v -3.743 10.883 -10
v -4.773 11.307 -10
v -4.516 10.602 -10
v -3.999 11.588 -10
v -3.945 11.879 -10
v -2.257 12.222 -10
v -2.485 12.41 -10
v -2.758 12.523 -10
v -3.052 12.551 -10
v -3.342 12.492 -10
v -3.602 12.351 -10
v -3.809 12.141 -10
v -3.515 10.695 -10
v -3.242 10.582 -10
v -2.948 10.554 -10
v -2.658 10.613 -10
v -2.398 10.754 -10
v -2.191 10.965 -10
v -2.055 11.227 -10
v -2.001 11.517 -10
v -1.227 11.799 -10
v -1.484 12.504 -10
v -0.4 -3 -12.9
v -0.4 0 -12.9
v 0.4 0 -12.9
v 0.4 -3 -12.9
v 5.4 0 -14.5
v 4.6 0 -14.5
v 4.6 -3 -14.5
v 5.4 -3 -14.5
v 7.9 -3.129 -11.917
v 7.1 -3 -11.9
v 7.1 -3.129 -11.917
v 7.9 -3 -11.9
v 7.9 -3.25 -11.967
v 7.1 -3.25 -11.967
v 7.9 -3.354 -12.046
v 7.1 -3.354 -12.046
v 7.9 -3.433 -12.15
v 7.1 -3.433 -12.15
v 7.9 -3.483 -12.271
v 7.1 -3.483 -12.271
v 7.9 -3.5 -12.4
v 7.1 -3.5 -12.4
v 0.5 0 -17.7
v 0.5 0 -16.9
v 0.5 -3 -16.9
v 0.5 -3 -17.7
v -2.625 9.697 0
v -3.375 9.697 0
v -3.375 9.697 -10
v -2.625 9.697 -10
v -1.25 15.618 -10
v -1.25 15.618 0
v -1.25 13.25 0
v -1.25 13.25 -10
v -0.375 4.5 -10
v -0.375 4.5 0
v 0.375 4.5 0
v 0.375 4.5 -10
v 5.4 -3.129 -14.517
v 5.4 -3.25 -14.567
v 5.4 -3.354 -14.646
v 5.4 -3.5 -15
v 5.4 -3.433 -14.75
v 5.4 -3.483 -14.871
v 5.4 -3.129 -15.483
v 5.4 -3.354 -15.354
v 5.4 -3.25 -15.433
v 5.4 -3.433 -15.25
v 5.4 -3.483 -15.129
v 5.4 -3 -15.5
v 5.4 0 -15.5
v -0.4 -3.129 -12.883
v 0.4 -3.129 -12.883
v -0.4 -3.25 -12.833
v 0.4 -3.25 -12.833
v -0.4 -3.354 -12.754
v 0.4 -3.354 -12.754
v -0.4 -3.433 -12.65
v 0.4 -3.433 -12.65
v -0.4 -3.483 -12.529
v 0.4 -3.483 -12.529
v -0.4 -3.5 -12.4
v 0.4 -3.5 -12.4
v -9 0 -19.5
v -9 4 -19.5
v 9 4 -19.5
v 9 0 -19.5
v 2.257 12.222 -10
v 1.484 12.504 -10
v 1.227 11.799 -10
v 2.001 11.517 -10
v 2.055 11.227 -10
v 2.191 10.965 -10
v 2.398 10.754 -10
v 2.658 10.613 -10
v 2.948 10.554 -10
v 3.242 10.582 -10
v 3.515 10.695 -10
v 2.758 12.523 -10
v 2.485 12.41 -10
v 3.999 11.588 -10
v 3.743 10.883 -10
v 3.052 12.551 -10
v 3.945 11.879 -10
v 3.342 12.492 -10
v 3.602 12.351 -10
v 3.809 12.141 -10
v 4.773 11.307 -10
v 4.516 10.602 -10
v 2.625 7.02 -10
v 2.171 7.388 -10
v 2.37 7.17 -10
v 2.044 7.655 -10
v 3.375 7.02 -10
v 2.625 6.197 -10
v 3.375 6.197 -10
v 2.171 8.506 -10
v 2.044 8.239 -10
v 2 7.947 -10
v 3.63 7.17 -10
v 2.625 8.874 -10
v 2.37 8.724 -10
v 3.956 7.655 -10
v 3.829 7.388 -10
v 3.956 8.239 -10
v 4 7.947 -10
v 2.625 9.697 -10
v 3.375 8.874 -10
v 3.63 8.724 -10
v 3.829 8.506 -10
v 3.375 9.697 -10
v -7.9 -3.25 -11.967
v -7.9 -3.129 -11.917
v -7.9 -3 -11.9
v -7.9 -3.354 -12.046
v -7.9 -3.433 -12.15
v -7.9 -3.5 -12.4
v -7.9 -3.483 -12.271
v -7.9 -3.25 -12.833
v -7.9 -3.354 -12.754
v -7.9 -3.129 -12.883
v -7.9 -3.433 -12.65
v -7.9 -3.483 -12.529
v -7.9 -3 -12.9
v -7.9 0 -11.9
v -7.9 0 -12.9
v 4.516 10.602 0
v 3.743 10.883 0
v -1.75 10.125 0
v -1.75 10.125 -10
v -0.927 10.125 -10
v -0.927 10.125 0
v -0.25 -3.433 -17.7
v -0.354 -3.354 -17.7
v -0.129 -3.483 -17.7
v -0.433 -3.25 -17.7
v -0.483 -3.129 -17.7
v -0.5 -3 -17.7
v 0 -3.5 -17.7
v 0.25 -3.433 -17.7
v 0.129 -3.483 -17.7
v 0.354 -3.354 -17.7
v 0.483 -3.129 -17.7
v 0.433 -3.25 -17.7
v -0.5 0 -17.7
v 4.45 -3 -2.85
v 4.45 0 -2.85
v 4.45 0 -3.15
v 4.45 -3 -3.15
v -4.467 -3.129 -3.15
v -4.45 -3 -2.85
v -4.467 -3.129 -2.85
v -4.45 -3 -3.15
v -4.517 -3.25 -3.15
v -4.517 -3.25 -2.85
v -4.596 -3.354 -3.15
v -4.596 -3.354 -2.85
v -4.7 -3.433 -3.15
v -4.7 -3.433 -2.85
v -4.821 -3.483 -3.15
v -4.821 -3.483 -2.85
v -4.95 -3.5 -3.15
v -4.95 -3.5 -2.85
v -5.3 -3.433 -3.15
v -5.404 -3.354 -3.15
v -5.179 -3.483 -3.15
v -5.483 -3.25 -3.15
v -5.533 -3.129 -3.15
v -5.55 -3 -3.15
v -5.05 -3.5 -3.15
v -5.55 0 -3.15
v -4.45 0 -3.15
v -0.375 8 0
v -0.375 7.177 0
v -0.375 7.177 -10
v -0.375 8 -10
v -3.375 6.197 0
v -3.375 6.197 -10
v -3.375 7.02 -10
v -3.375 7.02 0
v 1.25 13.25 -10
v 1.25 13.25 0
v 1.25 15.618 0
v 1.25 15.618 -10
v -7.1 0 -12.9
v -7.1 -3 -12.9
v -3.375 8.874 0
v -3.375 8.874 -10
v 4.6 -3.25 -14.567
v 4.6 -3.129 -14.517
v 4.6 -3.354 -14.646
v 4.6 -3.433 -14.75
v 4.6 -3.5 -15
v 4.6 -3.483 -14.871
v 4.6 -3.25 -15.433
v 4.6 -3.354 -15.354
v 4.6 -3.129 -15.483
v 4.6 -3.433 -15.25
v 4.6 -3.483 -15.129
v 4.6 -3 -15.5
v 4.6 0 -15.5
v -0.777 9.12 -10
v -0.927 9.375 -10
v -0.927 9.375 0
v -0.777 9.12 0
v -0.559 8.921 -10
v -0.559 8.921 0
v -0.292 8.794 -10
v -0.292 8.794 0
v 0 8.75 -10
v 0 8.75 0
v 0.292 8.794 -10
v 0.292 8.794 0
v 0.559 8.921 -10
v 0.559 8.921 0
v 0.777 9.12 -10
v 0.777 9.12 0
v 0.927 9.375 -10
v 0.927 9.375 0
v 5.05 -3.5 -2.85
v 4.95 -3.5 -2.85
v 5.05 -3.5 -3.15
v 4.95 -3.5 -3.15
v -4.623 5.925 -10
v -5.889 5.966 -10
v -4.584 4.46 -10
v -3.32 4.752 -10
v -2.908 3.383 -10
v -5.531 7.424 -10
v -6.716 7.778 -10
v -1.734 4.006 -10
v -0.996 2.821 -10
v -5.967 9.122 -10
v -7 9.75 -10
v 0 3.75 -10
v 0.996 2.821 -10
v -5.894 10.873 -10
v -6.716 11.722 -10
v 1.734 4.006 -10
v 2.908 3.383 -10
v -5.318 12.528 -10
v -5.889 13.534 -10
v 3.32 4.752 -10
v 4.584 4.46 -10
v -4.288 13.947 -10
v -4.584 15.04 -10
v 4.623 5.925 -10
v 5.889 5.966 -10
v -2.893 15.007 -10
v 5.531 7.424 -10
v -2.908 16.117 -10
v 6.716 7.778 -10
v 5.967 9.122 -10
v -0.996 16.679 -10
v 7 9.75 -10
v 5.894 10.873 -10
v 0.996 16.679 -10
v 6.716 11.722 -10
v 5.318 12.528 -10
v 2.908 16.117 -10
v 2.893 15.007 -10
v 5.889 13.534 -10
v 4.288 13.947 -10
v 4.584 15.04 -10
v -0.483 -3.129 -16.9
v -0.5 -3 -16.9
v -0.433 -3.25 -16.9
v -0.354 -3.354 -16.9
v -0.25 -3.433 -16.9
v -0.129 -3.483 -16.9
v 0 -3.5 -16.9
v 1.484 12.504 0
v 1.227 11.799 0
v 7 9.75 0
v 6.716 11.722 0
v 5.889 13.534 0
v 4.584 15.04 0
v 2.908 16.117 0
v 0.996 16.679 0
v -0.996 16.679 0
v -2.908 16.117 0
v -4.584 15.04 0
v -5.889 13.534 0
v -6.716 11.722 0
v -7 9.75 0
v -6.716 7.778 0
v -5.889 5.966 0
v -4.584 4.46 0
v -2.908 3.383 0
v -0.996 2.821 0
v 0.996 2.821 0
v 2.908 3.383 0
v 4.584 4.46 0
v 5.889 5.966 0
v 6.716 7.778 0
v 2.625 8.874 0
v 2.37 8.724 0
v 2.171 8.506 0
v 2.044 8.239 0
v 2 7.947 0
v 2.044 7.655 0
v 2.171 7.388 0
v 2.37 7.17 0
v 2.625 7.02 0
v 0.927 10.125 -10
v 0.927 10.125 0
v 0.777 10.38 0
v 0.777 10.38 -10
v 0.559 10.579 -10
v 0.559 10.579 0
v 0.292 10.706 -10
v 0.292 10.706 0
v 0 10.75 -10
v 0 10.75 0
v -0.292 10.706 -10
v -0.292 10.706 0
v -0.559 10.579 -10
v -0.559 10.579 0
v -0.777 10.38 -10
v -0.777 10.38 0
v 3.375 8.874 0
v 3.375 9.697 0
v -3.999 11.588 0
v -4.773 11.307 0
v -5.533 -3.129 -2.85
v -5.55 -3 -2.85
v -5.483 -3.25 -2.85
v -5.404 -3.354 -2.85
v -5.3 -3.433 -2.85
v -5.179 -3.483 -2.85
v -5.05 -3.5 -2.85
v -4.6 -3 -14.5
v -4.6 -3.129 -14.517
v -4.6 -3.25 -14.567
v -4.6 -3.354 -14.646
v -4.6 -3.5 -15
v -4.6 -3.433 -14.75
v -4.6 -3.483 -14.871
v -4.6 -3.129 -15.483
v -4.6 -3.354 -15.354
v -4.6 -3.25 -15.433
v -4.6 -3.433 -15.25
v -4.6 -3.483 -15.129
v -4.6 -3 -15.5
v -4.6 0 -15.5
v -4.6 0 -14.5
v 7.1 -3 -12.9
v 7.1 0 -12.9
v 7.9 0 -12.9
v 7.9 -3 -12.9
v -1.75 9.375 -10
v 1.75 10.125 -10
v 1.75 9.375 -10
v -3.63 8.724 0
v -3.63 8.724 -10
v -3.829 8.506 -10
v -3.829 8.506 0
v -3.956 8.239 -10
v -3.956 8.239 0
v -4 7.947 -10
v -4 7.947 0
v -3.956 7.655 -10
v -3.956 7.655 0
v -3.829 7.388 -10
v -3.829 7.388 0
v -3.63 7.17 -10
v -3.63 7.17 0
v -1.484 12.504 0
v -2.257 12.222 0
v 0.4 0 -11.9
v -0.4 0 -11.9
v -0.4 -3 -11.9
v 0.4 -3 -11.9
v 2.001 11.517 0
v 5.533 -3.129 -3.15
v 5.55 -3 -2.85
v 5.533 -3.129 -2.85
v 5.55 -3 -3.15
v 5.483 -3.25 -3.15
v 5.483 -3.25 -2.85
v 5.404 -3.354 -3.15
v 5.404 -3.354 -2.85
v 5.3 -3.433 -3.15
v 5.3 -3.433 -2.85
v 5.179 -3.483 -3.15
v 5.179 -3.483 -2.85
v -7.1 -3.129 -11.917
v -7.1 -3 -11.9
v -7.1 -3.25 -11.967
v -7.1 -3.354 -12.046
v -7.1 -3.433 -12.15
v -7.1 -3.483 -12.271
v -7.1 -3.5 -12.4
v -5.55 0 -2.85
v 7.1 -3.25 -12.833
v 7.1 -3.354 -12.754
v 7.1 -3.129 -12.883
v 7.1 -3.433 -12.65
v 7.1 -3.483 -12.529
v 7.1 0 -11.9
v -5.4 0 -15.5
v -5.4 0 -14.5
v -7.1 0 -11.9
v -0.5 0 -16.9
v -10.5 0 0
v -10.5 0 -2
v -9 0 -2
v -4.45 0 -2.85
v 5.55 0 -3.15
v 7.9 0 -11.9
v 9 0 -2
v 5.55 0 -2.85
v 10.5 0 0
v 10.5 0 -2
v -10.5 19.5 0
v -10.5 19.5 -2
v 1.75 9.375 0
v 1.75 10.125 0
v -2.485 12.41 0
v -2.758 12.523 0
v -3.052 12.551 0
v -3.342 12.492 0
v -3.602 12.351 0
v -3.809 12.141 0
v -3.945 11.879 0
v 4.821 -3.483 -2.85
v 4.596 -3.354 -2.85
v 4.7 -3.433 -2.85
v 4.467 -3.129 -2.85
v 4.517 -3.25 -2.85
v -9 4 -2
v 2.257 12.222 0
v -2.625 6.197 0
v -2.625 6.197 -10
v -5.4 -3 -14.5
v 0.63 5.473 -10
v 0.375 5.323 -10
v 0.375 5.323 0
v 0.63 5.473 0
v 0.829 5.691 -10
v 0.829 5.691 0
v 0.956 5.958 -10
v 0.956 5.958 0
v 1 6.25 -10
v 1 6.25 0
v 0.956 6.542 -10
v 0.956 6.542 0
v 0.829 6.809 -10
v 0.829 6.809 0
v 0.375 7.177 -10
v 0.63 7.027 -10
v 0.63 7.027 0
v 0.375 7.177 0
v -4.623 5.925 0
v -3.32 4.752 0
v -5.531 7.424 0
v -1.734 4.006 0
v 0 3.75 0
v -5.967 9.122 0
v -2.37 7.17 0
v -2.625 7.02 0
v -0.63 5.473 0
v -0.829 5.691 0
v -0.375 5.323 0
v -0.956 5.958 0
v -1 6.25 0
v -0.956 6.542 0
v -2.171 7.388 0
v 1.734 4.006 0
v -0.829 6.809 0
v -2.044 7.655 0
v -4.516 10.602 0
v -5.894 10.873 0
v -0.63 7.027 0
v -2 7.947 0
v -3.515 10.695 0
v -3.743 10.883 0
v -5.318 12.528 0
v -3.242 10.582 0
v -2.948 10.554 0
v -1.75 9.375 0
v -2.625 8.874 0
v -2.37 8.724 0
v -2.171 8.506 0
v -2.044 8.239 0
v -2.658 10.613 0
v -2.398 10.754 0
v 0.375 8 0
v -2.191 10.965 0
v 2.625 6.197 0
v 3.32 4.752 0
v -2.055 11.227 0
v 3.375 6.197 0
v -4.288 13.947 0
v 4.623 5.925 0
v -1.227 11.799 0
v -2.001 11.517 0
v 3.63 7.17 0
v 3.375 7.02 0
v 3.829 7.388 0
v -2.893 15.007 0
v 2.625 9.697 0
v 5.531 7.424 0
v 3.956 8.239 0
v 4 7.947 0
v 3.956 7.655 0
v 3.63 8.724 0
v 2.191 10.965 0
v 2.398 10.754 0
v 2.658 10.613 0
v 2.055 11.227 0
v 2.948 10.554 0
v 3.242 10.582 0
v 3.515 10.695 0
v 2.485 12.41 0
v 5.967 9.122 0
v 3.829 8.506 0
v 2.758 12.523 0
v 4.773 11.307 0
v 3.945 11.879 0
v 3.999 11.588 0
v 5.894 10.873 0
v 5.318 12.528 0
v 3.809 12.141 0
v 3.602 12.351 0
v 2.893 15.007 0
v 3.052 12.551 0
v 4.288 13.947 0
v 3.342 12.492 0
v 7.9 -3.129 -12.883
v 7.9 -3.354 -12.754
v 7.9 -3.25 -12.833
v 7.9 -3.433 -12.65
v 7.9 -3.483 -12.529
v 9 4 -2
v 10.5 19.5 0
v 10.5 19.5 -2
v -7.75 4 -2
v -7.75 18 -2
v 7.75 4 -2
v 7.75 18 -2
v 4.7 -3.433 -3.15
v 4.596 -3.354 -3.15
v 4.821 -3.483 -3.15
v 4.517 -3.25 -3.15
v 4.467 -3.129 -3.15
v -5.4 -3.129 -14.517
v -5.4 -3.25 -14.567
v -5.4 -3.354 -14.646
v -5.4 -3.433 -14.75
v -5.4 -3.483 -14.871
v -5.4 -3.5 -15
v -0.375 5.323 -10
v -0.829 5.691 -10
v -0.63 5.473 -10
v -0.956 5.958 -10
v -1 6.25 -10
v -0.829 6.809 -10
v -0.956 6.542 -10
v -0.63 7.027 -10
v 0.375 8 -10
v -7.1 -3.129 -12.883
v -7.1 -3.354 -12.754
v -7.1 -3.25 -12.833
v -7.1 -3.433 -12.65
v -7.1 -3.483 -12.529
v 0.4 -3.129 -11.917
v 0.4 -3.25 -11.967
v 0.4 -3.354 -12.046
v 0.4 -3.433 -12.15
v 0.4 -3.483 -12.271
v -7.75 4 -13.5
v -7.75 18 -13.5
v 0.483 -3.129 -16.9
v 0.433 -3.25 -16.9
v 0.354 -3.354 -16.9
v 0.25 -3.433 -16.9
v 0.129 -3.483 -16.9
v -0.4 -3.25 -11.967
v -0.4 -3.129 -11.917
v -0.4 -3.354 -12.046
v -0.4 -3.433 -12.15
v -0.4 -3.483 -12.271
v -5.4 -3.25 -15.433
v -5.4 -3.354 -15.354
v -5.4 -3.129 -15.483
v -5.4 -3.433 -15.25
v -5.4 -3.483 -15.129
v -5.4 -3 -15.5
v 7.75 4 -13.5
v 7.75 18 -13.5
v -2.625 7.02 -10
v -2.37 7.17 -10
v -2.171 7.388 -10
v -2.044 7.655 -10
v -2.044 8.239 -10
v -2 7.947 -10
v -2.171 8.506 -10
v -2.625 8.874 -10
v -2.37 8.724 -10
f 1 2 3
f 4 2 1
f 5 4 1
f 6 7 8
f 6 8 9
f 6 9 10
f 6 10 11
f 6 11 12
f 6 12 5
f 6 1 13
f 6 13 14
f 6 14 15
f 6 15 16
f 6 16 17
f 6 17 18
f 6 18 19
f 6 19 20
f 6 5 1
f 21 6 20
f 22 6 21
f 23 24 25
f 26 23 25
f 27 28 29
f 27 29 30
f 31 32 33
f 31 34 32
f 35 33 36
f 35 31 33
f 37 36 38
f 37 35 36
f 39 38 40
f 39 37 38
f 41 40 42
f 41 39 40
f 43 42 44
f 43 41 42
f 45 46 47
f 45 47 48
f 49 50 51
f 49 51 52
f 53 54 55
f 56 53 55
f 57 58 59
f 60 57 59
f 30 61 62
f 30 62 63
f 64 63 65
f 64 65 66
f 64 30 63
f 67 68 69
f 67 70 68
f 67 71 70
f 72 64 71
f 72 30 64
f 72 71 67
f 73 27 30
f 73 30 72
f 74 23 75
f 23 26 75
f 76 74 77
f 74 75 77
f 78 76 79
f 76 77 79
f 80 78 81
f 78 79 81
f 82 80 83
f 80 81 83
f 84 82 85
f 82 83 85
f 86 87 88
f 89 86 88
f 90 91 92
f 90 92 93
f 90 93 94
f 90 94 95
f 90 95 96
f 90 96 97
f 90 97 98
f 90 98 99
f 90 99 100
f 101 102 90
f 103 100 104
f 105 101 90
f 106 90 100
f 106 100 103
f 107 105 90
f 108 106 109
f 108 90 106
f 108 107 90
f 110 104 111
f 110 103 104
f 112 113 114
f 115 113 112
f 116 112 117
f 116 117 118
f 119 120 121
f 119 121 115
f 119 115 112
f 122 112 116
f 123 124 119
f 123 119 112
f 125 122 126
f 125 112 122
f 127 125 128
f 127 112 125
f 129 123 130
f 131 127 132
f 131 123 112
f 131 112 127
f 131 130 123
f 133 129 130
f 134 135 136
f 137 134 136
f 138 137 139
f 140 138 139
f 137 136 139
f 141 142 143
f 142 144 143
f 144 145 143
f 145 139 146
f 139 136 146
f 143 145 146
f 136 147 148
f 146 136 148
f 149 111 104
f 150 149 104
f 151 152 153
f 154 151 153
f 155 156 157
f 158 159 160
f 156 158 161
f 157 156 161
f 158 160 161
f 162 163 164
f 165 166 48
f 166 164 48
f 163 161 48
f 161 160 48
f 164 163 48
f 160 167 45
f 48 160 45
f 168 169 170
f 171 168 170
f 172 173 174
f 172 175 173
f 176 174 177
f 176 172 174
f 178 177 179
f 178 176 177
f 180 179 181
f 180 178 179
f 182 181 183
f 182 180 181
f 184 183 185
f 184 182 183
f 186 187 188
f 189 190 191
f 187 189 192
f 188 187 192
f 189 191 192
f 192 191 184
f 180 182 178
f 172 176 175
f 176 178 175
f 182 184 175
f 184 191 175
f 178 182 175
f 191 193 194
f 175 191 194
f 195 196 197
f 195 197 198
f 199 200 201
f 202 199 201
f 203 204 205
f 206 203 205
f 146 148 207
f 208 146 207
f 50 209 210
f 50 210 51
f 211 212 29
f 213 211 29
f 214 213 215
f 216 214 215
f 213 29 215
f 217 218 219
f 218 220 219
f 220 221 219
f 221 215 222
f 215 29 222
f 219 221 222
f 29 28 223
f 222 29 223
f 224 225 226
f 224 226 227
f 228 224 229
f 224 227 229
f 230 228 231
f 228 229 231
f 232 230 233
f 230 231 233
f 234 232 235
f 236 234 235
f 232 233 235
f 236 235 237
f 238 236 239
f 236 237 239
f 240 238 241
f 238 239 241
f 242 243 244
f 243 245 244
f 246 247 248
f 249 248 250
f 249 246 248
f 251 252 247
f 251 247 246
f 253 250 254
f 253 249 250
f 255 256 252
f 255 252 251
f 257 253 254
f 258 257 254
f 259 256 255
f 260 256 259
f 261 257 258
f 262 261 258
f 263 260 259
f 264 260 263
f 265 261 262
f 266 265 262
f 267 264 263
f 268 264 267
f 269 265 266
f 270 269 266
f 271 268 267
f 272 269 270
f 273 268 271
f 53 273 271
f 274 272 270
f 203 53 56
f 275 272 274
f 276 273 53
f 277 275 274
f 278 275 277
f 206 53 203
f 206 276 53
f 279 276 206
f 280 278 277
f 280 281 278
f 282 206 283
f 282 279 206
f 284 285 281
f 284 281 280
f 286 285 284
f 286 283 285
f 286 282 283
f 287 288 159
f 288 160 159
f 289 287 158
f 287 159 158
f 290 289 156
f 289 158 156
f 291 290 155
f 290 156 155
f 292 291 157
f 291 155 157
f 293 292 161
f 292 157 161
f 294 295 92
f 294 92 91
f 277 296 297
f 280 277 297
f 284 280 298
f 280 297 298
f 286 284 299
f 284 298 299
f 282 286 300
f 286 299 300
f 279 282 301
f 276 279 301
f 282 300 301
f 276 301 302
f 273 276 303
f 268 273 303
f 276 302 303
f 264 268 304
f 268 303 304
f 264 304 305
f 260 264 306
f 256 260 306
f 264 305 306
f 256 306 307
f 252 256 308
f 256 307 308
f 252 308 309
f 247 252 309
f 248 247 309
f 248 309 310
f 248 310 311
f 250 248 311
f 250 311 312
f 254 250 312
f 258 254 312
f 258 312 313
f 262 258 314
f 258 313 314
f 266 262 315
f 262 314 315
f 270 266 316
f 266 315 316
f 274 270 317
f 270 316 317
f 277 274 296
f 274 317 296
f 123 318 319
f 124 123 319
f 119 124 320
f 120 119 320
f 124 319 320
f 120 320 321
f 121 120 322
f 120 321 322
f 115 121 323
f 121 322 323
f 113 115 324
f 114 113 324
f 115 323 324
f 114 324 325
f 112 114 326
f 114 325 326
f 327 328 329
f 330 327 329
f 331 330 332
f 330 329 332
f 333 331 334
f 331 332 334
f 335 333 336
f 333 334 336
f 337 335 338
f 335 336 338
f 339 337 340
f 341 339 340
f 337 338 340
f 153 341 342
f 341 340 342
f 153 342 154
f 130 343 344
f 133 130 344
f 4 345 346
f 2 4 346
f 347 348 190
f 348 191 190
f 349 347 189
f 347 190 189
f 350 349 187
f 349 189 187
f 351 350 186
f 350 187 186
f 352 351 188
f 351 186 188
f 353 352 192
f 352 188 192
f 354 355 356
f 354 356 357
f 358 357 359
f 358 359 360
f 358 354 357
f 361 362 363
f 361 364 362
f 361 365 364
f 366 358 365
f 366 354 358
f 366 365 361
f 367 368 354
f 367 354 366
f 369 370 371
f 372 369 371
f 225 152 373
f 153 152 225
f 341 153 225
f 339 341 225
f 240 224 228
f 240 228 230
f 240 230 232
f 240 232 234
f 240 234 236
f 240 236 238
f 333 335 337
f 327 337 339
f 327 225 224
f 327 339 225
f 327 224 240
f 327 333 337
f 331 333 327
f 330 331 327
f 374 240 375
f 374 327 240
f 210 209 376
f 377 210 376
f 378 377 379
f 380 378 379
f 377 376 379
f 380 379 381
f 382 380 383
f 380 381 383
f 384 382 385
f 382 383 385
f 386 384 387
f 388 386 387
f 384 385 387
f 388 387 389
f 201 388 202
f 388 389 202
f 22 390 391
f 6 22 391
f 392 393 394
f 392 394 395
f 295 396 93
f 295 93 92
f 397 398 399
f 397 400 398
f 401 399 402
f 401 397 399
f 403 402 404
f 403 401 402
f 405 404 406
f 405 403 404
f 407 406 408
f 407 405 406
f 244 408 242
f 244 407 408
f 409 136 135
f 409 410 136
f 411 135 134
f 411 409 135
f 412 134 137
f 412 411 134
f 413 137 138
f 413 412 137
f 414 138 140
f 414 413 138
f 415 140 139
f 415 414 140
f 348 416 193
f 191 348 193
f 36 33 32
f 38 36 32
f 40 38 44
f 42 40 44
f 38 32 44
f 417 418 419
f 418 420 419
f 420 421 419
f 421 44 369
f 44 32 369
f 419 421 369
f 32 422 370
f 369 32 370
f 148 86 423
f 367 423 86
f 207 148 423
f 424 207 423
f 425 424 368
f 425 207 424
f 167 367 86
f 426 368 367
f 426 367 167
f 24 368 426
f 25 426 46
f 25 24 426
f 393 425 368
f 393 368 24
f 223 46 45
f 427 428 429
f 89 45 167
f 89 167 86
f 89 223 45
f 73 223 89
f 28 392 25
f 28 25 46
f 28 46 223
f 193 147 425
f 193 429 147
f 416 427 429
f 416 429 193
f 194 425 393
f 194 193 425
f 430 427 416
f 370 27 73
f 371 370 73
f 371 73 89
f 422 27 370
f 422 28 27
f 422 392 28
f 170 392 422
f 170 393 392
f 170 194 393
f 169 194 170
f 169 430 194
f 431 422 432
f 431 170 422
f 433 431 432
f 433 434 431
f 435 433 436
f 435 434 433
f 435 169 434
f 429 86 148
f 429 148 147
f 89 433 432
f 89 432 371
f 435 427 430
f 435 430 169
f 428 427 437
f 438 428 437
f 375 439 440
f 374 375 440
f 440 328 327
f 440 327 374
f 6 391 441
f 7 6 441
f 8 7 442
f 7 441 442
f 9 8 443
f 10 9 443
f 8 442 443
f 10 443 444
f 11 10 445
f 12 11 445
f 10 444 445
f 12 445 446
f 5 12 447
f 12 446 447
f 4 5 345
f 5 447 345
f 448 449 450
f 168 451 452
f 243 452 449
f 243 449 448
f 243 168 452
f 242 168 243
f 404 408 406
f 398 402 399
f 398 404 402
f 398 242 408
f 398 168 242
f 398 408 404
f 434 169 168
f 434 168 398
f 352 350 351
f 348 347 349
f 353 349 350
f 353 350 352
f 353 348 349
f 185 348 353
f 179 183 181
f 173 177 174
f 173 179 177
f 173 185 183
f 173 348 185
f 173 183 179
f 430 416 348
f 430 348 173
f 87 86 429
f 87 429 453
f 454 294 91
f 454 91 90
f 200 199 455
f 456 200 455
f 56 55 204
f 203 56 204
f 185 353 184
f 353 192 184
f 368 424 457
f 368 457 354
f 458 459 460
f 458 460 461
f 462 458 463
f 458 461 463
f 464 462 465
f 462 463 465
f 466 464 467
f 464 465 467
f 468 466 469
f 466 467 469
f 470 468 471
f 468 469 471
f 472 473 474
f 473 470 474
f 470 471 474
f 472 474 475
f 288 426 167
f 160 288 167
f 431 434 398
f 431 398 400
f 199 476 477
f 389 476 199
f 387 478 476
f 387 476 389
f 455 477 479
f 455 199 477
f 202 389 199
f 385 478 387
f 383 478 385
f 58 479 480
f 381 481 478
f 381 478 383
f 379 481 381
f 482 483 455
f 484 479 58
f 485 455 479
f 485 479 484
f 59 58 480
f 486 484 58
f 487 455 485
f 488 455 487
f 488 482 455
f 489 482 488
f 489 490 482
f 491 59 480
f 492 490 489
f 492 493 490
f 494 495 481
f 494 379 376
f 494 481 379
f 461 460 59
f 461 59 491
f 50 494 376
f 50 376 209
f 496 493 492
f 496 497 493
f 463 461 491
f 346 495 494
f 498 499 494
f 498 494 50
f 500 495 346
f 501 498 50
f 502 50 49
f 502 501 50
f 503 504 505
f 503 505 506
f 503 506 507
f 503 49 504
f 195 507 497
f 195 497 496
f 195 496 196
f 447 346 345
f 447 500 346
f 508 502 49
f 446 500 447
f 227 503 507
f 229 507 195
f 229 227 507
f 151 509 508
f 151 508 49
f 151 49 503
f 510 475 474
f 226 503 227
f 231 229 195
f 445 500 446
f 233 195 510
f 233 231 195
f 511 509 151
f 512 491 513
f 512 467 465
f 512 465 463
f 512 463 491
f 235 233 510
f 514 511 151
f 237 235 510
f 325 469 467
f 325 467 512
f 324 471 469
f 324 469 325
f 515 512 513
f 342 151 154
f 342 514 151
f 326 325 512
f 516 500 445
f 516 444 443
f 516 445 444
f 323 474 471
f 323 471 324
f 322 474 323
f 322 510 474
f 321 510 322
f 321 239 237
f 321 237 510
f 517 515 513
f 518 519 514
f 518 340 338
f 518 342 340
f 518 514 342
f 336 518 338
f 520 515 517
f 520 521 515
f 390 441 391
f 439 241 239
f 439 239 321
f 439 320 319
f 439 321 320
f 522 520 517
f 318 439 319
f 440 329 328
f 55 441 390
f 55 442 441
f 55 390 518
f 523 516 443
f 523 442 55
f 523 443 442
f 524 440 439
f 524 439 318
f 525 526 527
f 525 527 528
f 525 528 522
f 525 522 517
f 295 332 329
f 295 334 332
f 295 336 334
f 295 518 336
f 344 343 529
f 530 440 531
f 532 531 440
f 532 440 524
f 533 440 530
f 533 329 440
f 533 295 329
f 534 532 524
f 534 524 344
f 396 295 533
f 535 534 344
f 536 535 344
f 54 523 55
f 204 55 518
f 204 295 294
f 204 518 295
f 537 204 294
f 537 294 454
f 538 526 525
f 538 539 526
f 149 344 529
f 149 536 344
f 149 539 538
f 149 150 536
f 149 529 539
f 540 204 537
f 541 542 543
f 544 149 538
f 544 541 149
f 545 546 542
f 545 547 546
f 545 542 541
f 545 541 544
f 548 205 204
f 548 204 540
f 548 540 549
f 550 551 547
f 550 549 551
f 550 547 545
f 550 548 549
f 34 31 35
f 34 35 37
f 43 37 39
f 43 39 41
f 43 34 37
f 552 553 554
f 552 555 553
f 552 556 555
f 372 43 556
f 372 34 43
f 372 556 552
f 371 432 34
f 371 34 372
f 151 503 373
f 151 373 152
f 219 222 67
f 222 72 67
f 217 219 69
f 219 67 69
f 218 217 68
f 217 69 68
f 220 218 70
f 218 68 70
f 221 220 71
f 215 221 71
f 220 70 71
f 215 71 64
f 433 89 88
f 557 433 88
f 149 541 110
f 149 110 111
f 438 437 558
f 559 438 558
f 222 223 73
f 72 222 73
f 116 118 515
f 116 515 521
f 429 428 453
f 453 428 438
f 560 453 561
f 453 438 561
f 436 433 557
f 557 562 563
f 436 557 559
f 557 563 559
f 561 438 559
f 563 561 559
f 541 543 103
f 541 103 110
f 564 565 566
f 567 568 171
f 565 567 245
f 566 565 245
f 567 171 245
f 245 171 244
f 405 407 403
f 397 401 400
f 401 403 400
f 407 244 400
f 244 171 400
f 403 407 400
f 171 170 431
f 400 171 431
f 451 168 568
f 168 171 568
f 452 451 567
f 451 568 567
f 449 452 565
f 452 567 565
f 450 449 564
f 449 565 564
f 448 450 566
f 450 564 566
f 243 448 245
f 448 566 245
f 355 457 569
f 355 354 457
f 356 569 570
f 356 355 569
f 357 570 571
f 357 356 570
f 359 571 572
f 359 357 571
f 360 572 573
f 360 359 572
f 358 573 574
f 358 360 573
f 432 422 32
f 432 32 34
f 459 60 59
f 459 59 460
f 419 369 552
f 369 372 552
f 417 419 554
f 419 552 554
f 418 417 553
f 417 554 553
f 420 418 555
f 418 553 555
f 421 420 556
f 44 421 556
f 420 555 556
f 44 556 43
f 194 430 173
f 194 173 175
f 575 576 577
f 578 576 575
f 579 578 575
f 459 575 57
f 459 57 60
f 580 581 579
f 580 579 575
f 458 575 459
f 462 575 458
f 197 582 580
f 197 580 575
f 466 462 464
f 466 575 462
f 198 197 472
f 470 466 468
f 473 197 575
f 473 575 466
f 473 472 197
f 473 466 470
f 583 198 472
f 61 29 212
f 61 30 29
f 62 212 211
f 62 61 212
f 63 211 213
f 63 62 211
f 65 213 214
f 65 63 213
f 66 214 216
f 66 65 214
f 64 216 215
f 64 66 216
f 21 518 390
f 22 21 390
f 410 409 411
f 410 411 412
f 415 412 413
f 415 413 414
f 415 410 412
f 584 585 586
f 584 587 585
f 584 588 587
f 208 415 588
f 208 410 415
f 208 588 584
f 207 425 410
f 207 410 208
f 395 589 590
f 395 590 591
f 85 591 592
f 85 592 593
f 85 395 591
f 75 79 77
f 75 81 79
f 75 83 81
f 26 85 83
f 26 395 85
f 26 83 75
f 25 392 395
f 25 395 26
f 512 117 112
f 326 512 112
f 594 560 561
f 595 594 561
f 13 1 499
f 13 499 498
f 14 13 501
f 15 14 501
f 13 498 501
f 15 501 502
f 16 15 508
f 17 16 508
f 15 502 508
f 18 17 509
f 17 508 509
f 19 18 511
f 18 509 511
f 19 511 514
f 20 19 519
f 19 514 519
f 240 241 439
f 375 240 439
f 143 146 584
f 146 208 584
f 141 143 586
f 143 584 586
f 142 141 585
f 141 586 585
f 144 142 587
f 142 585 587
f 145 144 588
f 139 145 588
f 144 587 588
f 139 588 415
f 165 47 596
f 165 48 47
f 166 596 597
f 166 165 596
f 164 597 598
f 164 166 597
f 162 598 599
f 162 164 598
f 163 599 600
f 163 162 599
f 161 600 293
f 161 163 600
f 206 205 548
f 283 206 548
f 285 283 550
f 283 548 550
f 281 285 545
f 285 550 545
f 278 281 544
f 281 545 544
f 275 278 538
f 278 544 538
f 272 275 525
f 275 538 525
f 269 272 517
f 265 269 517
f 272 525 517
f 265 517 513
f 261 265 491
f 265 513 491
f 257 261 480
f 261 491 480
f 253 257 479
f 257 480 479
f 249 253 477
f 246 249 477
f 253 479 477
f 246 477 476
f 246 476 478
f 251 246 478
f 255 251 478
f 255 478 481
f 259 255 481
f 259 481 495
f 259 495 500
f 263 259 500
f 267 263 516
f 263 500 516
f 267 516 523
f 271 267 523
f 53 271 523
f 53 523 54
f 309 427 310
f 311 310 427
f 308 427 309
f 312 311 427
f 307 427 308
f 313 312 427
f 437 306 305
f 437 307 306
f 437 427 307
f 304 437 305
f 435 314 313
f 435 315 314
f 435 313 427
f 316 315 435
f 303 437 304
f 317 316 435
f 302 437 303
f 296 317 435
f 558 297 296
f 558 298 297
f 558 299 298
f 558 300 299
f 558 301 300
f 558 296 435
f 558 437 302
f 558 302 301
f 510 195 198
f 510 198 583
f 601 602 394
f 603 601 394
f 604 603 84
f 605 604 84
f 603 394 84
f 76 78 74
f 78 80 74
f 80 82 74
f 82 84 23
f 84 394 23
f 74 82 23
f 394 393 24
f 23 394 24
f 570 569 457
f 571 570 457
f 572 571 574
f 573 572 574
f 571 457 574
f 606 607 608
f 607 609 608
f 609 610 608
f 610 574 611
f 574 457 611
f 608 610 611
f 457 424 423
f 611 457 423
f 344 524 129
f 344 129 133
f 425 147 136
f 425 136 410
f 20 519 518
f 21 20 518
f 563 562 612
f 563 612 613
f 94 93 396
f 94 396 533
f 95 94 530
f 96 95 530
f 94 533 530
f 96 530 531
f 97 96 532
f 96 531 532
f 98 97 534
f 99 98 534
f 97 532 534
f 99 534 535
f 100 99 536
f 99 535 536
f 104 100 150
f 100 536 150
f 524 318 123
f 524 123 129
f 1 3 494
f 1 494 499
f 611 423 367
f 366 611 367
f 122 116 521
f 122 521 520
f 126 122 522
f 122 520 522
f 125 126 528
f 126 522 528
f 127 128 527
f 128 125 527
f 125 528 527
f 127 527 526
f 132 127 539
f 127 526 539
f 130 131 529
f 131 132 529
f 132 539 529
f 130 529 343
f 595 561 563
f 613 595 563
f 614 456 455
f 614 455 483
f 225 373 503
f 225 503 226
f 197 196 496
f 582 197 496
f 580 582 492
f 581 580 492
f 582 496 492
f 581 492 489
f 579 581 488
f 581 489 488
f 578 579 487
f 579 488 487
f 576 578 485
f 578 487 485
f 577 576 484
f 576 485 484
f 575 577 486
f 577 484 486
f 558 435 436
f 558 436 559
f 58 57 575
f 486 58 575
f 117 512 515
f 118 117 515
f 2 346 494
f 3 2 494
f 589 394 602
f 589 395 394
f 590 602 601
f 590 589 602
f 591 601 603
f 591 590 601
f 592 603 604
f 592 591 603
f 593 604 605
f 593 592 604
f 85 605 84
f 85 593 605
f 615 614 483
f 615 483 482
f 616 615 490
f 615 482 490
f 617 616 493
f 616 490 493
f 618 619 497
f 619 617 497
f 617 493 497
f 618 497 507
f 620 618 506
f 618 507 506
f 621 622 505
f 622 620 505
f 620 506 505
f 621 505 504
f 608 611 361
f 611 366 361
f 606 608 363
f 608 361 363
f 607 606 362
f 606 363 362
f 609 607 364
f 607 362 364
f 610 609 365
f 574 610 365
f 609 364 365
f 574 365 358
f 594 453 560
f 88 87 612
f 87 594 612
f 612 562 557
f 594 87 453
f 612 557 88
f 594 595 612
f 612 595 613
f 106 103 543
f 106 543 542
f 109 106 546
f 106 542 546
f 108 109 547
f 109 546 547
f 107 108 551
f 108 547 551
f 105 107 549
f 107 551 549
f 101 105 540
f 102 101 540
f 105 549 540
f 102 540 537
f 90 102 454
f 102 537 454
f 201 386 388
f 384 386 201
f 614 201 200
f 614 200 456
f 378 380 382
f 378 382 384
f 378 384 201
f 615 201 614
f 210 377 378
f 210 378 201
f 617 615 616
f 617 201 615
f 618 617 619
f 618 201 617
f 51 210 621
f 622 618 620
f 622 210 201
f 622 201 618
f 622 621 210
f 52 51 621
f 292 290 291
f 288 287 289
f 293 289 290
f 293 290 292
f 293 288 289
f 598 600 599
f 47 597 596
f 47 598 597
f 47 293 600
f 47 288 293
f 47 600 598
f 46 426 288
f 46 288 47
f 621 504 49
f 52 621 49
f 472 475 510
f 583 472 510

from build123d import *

# Parameters (mm, degrees)
SKETCH_1_W          = 21
SKETCH_1_H          = 19.5
EXTRUDE_1_DEPTH     = 2
SKETCH_3_W          = 15.5
SKETCH_3_H          = 18
EXTRUDE_2_DEPTH     = 13.5
SKETCH_4_W          = 18
SKETCH_4_H          = 4
EXTRUDE_3_DEPTH     = 19.5
SKETCH_2_R          = 7
CUT_EXTRUDE_1_DEPTH = 10
SKETCH_5_R          = 1
CUT_EXTRUDE_2_DEPTH = 10
SKETCH_6_W          = 0.75
SKETCH_6_H          = 3.5
SKETCH_6_W_2        = 3.5
SKETCH_6_H_2        = 0.75
CUT_EXTRUDE_3_DEPTH = 10
SKETCH_7_W          = 1.1
SKETCH_7_H          = 0.3
SKETCH_7_W_2        = 0.8
SKETCH_7_H_2        = 1
SKETCH_7_W_3        = 1
SKETCH_7_H_3        = 0.8
EXTRUDE_4_DEPTH     = 3.5
FILLET_1_R          = 0.5


with BuildPart() as part:
    # Эскиз1 → Бобышка-Вытянуть1 (new body)
    with BuildSketch(Plane.XY):
        with Locations((0, 9.75)):
            Rectangle(SKETCH_1_W, SKETCH_1_H)
    extrude(amount=-EXTRUDE_1_DEPTH)

    # Эскиз3 → Бобышка-Вытянуть2 (add)
    with BuildSketch(Plane.XY):
        with Locations((0, 9)):
            Rectangle(SKETCH_3_W, SKETCH_3_H)
    extrude(amount=-EXTRUDE_2_DEPTH)

    # Эскиз4 → Бобышка-Вытянуть3 (add)
    with BuildSketch(Plane.XY):
        with Locations((0, 2)):
            Rectangle(SKETCH_4_W, SKETCH_4_H)
    extrude(amount=-EXTRUDE_3_DEPTH)

    # Эскиз2 → Вырез-Вытянуть1 (cut)
    with BuildSketch(Plane.XY):
        with Locations((0, 9.75)):
            Circle(SKETCH_2_R)
        with BuildLine():
            Line((-1.25, 15.618347297), (-1.25, 13.25))
            Line((-1.25, 13.25), (1.25, 13.25))
            Line((1.25, 13.25), (1.25, 15.618347297))
            ThreePointArc((1.25, 15.618347297), (0, 3.75), (-1.25, 15.618347297))
        make_face(mode=Mode.SUBTRACT)
    extrude(amount=-CUT_EXTRUDE_1_DEPTH, mode=Mode.SUBTRACT)

    # Эскиз5 → Вырез-Вытянуть2 (cut)
    with BuildSketch(Plane.XY):
        with Locations((0, 6.25)):
            Circle(SKETCH_5_R)
        with Locations((-3, 7.947224362)):
            Circle(SKETCH_5_R)
        with Locations((3, 7.947224362)):
            Circle(SKETCH_5_R)
        with Locations((-3, 11.552775638)):
            Circle(SKETCH_5_R)
        with Locations((3, 11.552775638)):
            Circle(SKETCH_5_R)
        with Locations((0, 9.75)):
            Circle(SKETCH_5_R)
    extrude(amount=-CUT_EXTRUDE_2_DEPTH, mode=Mode.SUBTRACT)

    # Эскиз6 → Вырез-Вытянуть3 (cut)
    with BuildSketch(Plane.XY):
        Polygon((4.516204533, 10.601855654), (1.22728036, 11.798926156), (1.483795467, 12.503695621), (4.77271964, 11.30662512), align=None)
        with Locations((-3, 7.947224362)):
            Rectangle(SKETCH_6_W, SKETCH_6_H)
        with Locations((3, 7.947224362)):
            Rectangle(SKETCH_6_W, SKETCH_6_H)
        with Locations((0, 6.25)):
            Rectangle(SKETCH_6_W, SKETCH_6_H)
        Polygon((-4.516204533, 10.601855654), (-1.22728036, 11.798926156), (-1.483795467, 12.503695621), (-4.77271964, 11.30662512), align=None)
        with Locations((0, 9.75)):
            Rectangle(SKETCH_6_W_2, SKETCH_6_H_2)
    extrude(amount=-CUT_EXTRUDE_3_DEPTH, mode=Mode.SUBTRACT)

    # Эскиз7 → Бобышка-Вытянуть4 (add)
    with BuildSketch(Plane(origin=(0, 0, 0), x_dir=(1, 0, 0), z_dir=(0, 1, 0))):
        with Locations((-5, 3)):
            Rectangle(SKETCH_7_W, SKETCH_7_H)
        with Locations((5, 3)):
            Rectangle(SKETCH_7_W, SKETCH_7_H)
        with Locations((-7.5, 12.4)):
            Rectangle(SKETCH_7_W_2, SKETCH_7_H_2)
        with Locations((0, 12.4)):
            Rectangle(SKETCH_7_W_2, SKETCH_7_H_2)
        with Locations((7.5, 12.4)):
            Rectangle(SKETCH_7_W_2, SKETCH_7_H_2)
        with Locations((-5, 15)):
            Rectangle(SKETCH_7_W_2, SKETCH_7_H_2)
        with Locations((5, 15)):
            Rectangle(SKETCH_7_W_2, SKETCH_7_H_2)
        with Locations((0, 17.3)):
            Rectangle(SKETCH_7_W_3, SKETCH_7_H_3)
    extrude(amount=-EXTRUDE_4_DEPTH)

    # Скругление1
    fillet_1_edges = [part.edges().sort_by_distance(p)[0] for p in [
        (5.55, -3.5, -3),
        (4.45, -3.5, -3),
        (-4.45, -3.5, -3),
        (-5.55, -3.5, -3),
        (0.5, -3.5, -17.3),
        (-0.5, -3.5, -17.3),
        (7.5, -3.5, -12.9),
        (7.5, -3.5, -11.9),
        (5, -3.5, -15.5),
        (5, -3.5, -14.5),
        (0, -3.5, -12.9),
        (0, -3.5, -11.9),
        (-5, -3.5, -14.5),
        (-5, -3.5, -15.5),
        (-7.5, -3.5, -11.9),
        (-7.5, -3.5, -12.9),
    ]]
    fillet(fillet_1_edges, radius=FILLET_1_R - 0.0001)  # a hair under: the kernel refuses the full size


solid = part.part
